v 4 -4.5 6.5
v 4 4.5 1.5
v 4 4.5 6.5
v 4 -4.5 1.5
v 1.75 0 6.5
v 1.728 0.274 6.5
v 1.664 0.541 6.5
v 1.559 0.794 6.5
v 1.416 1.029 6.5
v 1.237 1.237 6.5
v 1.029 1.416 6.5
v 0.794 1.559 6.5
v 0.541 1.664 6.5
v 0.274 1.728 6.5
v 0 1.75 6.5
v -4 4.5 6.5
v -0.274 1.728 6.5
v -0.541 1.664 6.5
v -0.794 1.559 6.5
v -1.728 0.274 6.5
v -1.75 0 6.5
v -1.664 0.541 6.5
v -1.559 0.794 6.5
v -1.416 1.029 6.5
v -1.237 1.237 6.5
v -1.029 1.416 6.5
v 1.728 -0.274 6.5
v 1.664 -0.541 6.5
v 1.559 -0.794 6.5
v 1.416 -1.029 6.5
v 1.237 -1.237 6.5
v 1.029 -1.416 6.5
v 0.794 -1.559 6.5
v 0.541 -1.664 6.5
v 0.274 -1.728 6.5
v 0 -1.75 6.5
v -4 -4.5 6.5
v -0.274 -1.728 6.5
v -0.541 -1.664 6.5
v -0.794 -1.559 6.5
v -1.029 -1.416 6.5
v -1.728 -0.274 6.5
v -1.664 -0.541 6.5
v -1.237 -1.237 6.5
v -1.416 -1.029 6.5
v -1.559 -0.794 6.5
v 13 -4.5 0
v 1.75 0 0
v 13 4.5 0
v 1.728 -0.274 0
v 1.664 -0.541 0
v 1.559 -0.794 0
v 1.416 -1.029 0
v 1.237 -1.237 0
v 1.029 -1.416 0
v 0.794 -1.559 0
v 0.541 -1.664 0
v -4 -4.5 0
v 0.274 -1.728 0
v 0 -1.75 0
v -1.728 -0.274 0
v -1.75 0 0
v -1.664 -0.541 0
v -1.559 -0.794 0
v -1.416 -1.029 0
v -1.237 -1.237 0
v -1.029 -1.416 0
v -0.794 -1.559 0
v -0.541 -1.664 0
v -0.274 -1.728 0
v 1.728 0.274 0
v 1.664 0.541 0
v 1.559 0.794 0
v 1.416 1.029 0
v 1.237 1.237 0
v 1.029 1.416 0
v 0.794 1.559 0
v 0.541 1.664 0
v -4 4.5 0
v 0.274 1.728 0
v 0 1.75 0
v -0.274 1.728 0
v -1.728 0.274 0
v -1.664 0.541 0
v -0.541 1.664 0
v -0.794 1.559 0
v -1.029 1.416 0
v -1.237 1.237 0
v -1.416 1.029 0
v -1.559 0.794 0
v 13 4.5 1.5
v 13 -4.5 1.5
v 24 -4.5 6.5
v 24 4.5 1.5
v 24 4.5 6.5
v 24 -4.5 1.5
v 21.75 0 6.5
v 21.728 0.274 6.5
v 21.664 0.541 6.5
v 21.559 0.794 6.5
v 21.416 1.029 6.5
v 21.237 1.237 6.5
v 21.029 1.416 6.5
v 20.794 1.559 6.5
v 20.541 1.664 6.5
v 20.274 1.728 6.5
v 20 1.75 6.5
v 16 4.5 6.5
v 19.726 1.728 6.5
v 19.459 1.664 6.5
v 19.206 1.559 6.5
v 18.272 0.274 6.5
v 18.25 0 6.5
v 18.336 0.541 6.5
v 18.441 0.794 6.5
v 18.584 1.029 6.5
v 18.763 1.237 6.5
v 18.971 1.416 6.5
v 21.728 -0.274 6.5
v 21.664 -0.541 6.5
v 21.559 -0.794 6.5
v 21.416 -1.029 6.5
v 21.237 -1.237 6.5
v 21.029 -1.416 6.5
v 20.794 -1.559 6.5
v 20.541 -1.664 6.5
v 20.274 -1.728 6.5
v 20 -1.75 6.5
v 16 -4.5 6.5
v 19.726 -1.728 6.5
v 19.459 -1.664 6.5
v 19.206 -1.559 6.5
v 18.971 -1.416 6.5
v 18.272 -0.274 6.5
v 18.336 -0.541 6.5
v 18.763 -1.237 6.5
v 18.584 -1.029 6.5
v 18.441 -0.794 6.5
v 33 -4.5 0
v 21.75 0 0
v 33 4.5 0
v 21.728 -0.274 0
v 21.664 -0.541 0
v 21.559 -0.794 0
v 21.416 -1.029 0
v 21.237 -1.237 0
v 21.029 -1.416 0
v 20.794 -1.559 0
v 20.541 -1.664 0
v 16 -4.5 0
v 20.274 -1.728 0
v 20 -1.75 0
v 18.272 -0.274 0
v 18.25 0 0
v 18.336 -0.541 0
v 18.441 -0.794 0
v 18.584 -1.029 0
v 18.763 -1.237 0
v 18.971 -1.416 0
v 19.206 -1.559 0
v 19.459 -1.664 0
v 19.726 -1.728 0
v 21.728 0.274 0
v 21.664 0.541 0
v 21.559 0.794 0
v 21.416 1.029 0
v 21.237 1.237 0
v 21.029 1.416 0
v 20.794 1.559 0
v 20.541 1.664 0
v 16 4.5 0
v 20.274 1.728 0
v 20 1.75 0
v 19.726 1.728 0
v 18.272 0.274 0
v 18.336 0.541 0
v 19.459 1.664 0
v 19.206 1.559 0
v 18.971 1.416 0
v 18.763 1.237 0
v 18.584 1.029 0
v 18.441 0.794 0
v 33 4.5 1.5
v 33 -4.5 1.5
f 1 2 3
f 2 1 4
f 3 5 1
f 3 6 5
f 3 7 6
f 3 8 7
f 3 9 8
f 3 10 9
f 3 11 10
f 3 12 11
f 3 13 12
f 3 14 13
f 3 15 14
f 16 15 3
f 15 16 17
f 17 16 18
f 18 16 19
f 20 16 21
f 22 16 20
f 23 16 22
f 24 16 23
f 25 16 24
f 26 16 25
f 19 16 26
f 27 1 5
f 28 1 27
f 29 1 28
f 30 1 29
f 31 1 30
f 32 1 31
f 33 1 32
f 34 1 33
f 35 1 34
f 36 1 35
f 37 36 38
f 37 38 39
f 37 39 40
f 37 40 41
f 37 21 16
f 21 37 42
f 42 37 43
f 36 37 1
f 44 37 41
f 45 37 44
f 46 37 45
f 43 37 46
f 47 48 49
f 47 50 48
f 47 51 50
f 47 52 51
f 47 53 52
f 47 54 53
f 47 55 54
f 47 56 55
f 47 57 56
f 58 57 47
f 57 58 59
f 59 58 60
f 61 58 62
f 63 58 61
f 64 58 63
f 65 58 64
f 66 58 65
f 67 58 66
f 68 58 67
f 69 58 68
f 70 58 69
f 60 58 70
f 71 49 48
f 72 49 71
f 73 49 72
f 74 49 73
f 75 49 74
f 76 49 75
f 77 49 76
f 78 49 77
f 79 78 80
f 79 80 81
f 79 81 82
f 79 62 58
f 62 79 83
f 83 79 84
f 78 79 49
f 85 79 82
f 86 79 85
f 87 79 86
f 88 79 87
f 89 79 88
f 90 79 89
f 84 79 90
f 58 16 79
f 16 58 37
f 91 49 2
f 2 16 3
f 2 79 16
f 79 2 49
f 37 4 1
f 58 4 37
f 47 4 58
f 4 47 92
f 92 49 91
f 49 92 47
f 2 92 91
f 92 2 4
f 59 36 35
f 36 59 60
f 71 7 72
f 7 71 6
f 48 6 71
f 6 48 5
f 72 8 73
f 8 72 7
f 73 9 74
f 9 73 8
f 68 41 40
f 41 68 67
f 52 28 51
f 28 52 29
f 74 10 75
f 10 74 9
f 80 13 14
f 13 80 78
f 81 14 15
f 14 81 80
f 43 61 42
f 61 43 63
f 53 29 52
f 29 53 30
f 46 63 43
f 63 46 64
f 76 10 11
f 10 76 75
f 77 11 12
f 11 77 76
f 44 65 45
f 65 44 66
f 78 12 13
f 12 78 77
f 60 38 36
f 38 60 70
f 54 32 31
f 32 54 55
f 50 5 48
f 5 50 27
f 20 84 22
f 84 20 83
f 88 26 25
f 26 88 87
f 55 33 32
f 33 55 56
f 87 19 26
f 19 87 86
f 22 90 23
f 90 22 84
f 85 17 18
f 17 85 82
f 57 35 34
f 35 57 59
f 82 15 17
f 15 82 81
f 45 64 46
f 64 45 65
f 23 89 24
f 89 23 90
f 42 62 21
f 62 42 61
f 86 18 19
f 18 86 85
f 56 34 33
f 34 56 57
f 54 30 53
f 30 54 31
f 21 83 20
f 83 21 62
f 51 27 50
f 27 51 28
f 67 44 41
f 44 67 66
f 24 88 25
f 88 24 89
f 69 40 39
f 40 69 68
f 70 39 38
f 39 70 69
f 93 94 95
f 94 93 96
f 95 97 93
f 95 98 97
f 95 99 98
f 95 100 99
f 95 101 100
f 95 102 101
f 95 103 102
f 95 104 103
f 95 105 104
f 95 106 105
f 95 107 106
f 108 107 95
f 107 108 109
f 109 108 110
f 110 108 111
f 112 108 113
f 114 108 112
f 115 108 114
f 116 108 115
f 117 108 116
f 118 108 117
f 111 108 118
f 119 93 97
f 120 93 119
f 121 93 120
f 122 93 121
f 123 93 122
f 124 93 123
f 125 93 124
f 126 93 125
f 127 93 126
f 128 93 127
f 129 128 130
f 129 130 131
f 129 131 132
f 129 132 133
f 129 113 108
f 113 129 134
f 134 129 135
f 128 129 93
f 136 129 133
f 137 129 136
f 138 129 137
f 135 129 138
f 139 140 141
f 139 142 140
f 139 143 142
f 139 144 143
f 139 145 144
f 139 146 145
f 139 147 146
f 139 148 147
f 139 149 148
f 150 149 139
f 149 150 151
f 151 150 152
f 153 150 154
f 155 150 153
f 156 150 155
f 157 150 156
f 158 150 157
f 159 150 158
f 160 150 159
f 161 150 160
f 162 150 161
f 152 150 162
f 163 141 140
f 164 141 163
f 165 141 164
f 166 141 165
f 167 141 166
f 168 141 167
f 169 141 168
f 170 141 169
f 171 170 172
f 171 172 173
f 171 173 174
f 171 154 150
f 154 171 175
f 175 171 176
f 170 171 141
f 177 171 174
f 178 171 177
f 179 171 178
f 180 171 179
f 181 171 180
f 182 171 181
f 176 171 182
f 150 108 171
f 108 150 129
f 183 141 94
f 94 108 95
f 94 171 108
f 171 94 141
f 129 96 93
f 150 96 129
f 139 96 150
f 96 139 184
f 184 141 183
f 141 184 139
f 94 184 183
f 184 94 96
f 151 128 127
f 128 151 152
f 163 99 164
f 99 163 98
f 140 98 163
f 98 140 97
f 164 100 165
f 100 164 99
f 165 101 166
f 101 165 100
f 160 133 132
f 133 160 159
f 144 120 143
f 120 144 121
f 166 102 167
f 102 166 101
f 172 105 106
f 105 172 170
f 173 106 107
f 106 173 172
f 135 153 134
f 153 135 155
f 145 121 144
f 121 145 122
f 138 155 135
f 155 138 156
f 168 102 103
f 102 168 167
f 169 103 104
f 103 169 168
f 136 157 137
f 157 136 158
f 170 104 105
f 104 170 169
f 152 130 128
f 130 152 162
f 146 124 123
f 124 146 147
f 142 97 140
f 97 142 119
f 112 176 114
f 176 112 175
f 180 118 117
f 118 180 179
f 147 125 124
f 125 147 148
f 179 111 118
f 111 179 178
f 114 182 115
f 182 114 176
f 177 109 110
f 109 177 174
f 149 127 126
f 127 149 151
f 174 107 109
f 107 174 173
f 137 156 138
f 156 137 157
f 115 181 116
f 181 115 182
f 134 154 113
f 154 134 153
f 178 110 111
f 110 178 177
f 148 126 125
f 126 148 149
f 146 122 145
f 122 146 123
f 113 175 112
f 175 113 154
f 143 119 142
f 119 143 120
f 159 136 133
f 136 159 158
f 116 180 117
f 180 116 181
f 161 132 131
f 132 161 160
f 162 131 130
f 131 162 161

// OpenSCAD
eps = 0.01;
N = 2;
M = 1;

module ecd_holder()
{
  difference()
  {
    translate([-8/2, -9/2, 0])
    {
      cube([8, 9, 5+1.5]);
      translate([8, 0, 0])
        cube([9, 9, 1.5]);
    }
    // screw hole
    translate([0, 0, -eps])
      cylinder(d=3.5, h=10, $fn=40);
  }
}

for(iy=[0:M-1])
  for(ix=[0:N-1])
    translate([ix*20, iy*12, 0])
      ecd_holder();
